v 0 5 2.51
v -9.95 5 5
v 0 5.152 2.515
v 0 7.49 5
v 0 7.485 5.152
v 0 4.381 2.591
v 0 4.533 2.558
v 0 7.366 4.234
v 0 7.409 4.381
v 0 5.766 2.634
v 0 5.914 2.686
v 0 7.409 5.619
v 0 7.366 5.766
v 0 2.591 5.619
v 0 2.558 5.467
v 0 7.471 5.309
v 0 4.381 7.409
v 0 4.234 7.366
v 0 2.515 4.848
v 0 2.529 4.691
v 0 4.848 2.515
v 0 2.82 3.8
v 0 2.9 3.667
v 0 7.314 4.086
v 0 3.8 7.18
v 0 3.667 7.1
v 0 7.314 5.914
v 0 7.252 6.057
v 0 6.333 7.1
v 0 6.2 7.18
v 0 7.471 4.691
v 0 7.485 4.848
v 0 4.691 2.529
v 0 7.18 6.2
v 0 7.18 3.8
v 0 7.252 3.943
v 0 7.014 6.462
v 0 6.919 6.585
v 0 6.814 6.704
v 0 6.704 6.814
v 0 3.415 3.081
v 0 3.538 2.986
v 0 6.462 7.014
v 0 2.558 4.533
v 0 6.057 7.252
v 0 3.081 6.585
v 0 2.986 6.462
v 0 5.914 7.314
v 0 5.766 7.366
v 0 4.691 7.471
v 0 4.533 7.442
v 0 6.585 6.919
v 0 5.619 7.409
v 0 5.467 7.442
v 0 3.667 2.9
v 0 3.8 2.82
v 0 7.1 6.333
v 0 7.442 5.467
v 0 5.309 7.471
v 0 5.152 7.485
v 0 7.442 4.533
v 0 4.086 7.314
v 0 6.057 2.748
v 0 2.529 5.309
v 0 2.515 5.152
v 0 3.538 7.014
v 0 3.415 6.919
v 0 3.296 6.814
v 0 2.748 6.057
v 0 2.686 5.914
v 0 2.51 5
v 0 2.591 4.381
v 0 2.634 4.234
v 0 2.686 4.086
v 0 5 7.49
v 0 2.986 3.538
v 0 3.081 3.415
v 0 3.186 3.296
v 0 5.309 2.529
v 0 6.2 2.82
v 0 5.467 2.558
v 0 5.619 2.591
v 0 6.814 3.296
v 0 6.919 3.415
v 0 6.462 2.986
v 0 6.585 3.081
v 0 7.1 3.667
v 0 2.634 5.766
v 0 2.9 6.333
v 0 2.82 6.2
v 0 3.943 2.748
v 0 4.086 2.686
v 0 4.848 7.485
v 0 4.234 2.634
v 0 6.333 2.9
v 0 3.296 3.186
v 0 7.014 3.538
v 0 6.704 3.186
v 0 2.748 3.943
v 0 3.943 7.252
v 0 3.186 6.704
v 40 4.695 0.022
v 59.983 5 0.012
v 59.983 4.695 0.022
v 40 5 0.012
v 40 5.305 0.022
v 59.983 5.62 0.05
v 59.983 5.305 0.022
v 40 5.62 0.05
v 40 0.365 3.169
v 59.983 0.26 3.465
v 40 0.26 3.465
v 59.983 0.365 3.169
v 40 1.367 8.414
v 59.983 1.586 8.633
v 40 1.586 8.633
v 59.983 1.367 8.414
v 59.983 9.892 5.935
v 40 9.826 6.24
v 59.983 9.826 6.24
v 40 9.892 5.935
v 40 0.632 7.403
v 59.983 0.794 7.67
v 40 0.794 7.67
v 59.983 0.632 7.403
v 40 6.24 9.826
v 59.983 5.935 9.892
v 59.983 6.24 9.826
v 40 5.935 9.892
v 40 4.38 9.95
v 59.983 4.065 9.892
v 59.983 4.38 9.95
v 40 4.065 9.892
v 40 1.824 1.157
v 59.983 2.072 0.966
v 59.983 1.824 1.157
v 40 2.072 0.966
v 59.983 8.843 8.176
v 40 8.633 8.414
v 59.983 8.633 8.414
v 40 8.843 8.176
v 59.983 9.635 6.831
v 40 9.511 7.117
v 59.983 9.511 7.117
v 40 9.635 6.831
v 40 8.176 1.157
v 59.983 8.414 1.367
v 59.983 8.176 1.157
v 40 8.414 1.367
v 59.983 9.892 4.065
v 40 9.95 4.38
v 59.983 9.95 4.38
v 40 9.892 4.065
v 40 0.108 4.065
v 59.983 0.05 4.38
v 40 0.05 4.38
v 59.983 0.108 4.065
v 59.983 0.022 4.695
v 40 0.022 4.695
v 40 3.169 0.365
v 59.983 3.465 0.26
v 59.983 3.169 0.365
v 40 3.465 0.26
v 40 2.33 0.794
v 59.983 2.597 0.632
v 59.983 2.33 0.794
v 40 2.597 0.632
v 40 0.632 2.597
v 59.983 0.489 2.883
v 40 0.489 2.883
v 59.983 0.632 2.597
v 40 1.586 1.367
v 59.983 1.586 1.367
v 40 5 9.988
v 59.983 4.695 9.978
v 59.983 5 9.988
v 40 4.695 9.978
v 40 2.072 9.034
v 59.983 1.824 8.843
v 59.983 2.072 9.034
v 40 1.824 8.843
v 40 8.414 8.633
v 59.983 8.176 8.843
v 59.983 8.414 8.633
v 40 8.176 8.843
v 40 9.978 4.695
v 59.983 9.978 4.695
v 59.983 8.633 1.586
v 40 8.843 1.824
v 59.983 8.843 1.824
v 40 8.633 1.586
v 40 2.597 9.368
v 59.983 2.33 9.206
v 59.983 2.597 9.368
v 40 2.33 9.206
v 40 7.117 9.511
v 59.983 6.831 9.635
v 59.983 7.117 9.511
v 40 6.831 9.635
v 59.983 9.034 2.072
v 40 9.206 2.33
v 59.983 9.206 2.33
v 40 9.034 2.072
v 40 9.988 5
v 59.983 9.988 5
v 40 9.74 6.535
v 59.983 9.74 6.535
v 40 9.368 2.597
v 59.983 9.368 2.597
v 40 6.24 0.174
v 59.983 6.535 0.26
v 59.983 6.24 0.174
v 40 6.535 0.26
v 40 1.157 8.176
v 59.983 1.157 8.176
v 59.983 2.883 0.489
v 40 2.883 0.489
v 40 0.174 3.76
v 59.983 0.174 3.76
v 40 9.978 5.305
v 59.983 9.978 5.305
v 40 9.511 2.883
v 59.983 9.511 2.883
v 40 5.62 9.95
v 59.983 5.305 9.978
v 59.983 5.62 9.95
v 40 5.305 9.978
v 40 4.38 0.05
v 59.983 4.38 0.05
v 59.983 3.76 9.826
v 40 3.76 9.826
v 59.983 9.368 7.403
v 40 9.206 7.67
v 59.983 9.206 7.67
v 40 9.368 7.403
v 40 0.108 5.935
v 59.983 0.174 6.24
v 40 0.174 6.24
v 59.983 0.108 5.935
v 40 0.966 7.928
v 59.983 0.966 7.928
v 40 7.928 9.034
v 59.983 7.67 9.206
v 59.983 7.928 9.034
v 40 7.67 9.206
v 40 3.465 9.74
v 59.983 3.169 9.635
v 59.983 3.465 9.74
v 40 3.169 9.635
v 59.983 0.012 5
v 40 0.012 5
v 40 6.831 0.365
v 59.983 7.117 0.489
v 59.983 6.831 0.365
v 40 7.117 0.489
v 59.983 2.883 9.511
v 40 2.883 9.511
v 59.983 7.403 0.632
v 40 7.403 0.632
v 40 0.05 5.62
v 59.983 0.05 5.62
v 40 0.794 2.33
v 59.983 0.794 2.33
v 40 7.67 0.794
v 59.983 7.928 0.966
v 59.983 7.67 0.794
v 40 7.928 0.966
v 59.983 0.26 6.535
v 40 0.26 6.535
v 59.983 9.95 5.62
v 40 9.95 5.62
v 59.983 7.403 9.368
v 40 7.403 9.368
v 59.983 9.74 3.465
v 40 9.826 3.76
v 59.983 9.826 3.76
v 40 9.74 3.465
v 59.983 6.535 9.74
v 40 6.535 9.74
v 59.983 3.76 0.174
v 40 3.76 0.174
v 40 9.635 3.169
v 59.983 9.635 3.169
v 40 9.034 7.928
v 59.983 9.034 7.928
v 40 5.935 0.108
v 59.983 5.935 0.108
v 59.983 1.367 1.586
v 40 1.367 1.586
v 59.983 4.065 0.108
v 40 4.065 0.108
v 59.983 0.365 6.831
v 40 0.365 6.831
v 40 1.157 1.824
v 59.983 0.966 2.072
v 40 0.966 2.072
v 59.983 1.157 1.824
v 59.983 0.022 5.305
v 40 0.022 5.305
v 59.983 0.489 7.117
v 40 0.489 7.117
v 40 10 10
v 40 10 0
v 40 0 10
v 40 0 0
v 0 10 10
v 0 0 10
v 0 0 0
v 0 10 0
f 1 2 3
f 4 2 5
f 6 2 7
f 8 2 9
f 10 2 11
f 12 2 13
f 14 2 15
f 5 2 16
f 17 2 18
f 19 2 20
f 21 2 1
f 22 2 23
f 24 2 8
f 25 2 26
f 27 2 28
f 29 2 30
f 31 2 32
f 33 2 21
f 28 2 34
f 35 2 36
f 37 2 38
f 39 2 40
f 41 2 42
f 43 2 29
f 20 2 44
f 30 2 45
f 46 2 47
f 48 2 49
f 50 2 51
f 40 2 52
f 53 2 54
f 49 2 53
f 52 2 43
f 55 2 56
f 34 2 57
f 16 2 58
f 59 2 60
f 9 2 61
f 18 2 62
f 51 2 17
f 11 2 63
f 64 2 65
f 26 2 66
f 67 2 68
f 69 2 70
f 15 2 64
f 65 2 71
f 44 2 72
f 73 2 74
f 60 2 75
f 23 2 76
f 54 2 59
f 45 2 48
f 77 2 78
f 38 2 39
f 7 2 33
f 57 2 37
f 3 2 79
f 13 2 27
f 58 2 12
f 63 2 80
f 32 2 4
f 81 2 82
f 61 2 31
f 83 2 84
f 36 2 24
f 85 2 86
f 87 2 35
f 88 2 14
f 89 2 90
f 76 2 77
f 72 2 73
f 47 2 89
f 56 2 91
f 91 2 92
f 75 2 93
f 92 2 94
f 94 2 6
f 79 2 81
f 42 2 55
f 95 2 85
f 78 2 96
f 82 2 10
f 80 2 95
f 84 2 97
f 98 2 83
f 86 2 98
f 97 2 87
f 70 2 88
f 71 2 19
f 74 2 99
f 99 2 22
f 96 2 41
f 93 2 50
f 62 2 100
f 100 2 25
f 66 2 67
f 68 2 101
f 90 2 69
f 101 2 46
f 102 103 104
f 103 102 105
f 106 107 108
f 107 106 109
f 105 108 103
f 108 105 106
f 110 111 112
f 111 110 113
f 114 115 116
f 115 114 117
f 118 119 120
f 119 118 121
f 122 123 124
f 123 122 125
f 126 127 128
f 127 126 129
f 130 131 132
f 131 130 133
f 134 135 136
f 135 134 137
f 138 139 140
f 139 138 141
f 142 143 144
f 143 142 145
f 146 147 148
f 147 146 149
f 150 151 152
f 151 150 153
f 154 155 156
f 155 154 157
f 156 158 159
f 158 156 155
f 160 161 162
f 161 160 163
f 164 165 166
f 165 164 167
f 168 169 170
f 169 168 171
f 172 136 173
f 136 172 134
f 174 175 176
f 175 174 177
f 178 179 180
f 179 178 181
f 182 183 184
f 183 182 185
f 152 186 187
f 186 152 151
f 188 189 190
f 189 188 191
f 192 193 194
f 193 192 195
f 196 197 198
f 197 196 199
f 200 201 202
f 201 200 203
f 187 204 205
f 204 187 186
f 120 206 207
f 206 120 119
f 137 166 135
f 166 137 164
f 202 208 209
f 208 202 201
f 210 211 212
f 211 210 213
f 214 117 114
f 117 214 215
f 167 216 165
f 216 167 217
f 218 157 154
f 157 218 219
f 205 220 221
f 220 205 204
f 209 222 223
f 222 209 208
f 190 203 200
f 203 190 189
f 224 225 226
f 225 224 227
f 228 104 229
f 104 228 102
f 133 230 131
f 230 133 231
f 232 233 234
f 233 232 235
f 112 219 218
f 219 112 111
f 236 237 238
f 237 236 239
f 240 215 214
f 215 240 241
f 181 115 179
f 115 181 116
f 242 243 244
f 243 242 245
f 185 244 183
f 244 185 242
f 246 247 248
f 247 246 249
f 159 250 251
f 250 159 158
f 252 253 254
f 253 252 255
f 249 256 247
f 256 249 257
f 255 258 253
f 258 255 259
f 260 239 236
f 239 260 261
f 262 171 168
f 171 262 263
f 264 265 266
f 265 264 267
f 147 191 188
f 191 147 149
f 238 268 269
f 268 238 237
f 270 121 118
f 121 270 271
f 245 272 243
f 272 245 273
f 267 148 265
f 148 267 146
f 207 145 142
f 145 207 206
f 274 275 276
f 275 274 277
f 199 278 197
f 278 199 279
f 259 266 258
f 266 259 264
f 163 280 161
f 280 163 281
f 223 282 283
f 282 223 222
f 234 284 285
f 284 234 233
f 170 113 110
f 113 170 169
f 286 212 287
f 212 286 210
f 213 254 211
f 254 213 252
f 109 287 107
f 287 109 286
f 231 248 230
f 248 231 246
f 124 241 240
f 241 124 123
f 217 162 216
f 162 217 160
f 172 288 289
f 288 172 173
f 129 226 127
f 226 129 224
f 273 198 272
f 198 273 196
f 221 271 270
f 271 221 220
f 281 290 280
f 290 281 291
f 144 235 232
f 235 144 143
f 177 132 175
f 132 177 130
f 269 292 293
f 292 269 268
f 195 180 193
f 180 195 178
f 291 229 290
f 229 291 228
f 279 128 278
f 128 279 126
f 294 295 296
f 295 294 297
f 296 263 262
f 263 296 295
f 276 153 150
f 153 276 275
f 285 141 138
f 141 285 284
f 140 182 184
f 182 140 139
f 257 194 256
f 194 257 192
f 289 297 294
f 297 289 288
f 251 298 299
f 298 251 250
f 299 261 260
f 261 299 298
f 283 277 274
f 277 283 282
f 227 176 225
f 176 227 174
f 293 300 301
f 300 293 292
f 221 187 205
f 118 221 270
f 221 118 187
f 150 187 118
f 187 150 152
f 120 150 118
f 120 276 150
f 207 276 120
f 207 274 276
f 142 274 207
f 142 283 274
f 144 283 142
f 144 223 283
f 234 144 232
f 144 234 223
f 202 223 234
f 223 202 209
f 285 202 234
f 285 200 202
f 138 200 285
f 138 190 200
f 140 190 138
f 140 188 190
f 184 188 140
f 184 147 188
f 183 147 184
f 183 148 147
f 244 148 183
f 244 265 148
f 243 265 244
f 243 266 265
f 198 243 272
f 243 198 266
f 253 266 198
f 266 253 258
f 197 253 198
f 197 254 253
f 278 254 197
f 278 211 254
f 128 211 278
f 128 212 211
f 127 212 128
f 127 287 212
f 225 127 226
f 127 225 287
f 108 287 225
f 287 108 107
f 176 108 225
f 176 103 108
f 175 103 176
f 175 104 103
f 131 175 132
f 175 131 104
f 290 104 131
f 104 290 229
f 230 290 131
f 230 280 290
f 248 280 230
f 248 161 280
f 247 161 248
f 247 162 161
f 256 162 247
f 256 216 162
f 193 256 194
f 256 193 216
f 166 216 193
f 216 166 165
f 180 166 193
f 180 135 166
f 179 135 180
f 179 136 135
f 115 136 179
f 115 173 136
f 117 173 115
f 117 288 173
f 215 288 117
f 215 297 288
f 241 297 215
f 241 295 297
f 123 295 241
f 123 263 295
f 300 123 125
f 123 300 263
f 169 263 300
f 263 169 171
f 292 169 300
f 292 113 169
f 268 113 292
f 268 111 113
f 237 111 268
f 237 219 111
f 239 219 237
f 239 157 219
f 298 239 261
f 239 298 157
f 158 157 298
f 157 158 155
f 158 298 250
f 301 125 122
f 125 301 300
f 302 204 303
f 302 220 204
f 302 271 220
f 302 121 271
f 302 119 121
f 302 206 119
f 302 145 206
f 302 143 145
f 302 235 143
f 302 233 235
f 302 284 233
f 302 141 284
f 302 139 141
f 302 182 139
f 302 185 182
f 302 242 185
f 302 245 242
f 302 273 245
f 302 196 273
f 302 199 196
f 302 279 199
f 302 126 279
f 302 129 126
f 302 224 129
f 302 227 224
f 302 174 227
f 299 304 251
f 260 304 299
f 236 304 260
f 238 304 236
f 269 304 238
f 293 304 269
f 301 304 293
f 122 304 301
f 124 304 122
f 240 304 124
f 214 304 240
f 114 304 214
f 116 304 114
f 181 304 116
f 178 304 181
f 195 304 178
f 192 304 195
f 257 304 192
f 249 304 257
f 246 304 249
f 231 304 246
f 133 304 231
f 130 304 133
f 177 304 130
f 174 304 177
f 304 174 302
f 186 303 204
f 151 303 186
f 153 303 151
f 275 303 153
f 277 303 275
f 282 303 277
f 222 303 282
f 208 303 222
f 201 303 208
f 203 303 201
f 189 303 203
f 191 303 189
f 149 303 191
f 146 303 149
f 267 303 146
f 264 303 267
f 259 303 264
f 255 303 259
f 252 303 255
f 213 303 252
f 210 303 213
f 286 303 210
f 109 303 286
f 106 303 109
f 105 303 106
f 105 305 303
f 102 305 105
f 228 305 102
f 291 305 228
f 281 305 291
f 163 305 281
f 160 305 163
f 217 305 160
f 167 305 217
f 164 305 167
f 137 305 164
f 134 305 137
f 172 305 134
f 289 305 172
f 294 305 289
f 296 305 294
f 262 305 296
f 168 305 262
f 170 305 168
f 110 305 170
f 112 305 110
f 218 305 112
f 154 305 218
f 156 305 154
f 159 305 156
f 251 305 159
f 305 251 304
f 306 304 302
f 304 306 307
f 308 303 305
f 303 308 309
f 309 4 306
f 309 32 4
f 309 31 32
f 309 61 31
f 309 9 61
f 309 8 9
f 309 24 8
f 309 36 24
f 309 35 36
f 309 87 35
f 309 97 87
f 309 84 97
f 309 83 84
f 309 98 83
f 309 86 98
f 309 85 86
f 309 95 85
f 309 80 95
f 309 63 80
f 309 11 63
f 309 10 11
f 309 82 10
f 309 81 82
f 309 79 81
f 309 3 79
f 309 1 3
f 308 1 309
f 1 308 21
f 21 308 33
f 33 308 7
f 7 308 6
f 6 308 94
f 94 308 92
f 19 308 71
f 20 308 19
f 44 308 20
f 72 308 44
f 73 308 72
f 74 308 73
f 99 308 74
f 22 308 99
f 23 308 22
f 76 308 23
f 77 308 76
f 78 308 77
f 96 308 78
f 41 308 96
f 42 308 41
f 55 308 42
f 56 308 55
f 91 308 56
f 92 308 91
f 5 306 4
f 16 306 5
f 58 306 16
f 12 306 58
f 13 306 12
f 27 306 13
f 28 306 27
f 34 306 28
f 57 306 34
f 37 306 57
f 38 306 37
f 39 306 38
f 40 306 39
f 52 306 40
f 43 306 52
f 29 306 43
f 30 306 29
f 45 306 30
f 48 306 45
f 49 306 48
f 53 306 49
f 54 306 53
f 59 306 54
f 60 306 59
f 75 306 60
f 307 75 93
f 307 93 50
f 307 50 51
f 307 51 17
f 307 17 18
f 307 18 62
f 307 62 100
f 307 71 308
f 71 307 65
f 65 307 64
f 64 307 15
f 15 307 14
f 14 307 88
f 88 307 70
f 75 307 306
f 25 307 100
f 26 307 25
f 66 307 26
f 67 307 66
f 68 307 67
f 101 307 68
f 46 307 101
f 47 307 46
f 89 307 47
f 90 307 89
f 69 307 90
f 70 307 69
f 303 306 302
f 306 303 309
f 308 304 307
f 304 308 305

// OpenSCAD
$fn=100;

module hopper(ht, funnel_h, funnel_r, orifice_r, hopper_center_yz) {
    funnel_extension = orifice_r*funnel_h/(funnel_r - orifice_r);
    overlap = 1e-6*funnel_h;

    translate([-funnel_extension, hopper_center_yz, hopper_center_yz]) {
       rotate([0,90,0]) {
          union(){
             cylinder(h = funnel_h + funnel_extension, r1 = 0, r2 = funnel_r, center = false);
             translate([0,0,funnel_h + funnel_extension - overlap]){
                cylinder(h = ht, r = funnel_r, center = false);
             }
          }
       }
    }
}

module exa_hopper(vis_mode=true) {
    domain = [0.004, 0.001, 0.001];
    ht = 0.005;
    funnel_h = 0.000999;
    funnel_r=0.000499;
    orifice_r=0.000249;
    hopper_center_yz=0.0005;
    
    scl = vis_mode ? 1e4 : 1.0; //scale for visualization
    
    scale(scl) {
       hopper(ht = ht, 
       funnel_h = funnel_h, 
       funnel_r = funnel_r, 
       orifice_r = orifice_r, 
       hopper_center_yz = hopper_center_yz);
    }
    
    if(vis_mode) {
        color("gray", 0.5) cube(size = scl * domain);
    }
}

exa_hopper(vis_mode=true);
